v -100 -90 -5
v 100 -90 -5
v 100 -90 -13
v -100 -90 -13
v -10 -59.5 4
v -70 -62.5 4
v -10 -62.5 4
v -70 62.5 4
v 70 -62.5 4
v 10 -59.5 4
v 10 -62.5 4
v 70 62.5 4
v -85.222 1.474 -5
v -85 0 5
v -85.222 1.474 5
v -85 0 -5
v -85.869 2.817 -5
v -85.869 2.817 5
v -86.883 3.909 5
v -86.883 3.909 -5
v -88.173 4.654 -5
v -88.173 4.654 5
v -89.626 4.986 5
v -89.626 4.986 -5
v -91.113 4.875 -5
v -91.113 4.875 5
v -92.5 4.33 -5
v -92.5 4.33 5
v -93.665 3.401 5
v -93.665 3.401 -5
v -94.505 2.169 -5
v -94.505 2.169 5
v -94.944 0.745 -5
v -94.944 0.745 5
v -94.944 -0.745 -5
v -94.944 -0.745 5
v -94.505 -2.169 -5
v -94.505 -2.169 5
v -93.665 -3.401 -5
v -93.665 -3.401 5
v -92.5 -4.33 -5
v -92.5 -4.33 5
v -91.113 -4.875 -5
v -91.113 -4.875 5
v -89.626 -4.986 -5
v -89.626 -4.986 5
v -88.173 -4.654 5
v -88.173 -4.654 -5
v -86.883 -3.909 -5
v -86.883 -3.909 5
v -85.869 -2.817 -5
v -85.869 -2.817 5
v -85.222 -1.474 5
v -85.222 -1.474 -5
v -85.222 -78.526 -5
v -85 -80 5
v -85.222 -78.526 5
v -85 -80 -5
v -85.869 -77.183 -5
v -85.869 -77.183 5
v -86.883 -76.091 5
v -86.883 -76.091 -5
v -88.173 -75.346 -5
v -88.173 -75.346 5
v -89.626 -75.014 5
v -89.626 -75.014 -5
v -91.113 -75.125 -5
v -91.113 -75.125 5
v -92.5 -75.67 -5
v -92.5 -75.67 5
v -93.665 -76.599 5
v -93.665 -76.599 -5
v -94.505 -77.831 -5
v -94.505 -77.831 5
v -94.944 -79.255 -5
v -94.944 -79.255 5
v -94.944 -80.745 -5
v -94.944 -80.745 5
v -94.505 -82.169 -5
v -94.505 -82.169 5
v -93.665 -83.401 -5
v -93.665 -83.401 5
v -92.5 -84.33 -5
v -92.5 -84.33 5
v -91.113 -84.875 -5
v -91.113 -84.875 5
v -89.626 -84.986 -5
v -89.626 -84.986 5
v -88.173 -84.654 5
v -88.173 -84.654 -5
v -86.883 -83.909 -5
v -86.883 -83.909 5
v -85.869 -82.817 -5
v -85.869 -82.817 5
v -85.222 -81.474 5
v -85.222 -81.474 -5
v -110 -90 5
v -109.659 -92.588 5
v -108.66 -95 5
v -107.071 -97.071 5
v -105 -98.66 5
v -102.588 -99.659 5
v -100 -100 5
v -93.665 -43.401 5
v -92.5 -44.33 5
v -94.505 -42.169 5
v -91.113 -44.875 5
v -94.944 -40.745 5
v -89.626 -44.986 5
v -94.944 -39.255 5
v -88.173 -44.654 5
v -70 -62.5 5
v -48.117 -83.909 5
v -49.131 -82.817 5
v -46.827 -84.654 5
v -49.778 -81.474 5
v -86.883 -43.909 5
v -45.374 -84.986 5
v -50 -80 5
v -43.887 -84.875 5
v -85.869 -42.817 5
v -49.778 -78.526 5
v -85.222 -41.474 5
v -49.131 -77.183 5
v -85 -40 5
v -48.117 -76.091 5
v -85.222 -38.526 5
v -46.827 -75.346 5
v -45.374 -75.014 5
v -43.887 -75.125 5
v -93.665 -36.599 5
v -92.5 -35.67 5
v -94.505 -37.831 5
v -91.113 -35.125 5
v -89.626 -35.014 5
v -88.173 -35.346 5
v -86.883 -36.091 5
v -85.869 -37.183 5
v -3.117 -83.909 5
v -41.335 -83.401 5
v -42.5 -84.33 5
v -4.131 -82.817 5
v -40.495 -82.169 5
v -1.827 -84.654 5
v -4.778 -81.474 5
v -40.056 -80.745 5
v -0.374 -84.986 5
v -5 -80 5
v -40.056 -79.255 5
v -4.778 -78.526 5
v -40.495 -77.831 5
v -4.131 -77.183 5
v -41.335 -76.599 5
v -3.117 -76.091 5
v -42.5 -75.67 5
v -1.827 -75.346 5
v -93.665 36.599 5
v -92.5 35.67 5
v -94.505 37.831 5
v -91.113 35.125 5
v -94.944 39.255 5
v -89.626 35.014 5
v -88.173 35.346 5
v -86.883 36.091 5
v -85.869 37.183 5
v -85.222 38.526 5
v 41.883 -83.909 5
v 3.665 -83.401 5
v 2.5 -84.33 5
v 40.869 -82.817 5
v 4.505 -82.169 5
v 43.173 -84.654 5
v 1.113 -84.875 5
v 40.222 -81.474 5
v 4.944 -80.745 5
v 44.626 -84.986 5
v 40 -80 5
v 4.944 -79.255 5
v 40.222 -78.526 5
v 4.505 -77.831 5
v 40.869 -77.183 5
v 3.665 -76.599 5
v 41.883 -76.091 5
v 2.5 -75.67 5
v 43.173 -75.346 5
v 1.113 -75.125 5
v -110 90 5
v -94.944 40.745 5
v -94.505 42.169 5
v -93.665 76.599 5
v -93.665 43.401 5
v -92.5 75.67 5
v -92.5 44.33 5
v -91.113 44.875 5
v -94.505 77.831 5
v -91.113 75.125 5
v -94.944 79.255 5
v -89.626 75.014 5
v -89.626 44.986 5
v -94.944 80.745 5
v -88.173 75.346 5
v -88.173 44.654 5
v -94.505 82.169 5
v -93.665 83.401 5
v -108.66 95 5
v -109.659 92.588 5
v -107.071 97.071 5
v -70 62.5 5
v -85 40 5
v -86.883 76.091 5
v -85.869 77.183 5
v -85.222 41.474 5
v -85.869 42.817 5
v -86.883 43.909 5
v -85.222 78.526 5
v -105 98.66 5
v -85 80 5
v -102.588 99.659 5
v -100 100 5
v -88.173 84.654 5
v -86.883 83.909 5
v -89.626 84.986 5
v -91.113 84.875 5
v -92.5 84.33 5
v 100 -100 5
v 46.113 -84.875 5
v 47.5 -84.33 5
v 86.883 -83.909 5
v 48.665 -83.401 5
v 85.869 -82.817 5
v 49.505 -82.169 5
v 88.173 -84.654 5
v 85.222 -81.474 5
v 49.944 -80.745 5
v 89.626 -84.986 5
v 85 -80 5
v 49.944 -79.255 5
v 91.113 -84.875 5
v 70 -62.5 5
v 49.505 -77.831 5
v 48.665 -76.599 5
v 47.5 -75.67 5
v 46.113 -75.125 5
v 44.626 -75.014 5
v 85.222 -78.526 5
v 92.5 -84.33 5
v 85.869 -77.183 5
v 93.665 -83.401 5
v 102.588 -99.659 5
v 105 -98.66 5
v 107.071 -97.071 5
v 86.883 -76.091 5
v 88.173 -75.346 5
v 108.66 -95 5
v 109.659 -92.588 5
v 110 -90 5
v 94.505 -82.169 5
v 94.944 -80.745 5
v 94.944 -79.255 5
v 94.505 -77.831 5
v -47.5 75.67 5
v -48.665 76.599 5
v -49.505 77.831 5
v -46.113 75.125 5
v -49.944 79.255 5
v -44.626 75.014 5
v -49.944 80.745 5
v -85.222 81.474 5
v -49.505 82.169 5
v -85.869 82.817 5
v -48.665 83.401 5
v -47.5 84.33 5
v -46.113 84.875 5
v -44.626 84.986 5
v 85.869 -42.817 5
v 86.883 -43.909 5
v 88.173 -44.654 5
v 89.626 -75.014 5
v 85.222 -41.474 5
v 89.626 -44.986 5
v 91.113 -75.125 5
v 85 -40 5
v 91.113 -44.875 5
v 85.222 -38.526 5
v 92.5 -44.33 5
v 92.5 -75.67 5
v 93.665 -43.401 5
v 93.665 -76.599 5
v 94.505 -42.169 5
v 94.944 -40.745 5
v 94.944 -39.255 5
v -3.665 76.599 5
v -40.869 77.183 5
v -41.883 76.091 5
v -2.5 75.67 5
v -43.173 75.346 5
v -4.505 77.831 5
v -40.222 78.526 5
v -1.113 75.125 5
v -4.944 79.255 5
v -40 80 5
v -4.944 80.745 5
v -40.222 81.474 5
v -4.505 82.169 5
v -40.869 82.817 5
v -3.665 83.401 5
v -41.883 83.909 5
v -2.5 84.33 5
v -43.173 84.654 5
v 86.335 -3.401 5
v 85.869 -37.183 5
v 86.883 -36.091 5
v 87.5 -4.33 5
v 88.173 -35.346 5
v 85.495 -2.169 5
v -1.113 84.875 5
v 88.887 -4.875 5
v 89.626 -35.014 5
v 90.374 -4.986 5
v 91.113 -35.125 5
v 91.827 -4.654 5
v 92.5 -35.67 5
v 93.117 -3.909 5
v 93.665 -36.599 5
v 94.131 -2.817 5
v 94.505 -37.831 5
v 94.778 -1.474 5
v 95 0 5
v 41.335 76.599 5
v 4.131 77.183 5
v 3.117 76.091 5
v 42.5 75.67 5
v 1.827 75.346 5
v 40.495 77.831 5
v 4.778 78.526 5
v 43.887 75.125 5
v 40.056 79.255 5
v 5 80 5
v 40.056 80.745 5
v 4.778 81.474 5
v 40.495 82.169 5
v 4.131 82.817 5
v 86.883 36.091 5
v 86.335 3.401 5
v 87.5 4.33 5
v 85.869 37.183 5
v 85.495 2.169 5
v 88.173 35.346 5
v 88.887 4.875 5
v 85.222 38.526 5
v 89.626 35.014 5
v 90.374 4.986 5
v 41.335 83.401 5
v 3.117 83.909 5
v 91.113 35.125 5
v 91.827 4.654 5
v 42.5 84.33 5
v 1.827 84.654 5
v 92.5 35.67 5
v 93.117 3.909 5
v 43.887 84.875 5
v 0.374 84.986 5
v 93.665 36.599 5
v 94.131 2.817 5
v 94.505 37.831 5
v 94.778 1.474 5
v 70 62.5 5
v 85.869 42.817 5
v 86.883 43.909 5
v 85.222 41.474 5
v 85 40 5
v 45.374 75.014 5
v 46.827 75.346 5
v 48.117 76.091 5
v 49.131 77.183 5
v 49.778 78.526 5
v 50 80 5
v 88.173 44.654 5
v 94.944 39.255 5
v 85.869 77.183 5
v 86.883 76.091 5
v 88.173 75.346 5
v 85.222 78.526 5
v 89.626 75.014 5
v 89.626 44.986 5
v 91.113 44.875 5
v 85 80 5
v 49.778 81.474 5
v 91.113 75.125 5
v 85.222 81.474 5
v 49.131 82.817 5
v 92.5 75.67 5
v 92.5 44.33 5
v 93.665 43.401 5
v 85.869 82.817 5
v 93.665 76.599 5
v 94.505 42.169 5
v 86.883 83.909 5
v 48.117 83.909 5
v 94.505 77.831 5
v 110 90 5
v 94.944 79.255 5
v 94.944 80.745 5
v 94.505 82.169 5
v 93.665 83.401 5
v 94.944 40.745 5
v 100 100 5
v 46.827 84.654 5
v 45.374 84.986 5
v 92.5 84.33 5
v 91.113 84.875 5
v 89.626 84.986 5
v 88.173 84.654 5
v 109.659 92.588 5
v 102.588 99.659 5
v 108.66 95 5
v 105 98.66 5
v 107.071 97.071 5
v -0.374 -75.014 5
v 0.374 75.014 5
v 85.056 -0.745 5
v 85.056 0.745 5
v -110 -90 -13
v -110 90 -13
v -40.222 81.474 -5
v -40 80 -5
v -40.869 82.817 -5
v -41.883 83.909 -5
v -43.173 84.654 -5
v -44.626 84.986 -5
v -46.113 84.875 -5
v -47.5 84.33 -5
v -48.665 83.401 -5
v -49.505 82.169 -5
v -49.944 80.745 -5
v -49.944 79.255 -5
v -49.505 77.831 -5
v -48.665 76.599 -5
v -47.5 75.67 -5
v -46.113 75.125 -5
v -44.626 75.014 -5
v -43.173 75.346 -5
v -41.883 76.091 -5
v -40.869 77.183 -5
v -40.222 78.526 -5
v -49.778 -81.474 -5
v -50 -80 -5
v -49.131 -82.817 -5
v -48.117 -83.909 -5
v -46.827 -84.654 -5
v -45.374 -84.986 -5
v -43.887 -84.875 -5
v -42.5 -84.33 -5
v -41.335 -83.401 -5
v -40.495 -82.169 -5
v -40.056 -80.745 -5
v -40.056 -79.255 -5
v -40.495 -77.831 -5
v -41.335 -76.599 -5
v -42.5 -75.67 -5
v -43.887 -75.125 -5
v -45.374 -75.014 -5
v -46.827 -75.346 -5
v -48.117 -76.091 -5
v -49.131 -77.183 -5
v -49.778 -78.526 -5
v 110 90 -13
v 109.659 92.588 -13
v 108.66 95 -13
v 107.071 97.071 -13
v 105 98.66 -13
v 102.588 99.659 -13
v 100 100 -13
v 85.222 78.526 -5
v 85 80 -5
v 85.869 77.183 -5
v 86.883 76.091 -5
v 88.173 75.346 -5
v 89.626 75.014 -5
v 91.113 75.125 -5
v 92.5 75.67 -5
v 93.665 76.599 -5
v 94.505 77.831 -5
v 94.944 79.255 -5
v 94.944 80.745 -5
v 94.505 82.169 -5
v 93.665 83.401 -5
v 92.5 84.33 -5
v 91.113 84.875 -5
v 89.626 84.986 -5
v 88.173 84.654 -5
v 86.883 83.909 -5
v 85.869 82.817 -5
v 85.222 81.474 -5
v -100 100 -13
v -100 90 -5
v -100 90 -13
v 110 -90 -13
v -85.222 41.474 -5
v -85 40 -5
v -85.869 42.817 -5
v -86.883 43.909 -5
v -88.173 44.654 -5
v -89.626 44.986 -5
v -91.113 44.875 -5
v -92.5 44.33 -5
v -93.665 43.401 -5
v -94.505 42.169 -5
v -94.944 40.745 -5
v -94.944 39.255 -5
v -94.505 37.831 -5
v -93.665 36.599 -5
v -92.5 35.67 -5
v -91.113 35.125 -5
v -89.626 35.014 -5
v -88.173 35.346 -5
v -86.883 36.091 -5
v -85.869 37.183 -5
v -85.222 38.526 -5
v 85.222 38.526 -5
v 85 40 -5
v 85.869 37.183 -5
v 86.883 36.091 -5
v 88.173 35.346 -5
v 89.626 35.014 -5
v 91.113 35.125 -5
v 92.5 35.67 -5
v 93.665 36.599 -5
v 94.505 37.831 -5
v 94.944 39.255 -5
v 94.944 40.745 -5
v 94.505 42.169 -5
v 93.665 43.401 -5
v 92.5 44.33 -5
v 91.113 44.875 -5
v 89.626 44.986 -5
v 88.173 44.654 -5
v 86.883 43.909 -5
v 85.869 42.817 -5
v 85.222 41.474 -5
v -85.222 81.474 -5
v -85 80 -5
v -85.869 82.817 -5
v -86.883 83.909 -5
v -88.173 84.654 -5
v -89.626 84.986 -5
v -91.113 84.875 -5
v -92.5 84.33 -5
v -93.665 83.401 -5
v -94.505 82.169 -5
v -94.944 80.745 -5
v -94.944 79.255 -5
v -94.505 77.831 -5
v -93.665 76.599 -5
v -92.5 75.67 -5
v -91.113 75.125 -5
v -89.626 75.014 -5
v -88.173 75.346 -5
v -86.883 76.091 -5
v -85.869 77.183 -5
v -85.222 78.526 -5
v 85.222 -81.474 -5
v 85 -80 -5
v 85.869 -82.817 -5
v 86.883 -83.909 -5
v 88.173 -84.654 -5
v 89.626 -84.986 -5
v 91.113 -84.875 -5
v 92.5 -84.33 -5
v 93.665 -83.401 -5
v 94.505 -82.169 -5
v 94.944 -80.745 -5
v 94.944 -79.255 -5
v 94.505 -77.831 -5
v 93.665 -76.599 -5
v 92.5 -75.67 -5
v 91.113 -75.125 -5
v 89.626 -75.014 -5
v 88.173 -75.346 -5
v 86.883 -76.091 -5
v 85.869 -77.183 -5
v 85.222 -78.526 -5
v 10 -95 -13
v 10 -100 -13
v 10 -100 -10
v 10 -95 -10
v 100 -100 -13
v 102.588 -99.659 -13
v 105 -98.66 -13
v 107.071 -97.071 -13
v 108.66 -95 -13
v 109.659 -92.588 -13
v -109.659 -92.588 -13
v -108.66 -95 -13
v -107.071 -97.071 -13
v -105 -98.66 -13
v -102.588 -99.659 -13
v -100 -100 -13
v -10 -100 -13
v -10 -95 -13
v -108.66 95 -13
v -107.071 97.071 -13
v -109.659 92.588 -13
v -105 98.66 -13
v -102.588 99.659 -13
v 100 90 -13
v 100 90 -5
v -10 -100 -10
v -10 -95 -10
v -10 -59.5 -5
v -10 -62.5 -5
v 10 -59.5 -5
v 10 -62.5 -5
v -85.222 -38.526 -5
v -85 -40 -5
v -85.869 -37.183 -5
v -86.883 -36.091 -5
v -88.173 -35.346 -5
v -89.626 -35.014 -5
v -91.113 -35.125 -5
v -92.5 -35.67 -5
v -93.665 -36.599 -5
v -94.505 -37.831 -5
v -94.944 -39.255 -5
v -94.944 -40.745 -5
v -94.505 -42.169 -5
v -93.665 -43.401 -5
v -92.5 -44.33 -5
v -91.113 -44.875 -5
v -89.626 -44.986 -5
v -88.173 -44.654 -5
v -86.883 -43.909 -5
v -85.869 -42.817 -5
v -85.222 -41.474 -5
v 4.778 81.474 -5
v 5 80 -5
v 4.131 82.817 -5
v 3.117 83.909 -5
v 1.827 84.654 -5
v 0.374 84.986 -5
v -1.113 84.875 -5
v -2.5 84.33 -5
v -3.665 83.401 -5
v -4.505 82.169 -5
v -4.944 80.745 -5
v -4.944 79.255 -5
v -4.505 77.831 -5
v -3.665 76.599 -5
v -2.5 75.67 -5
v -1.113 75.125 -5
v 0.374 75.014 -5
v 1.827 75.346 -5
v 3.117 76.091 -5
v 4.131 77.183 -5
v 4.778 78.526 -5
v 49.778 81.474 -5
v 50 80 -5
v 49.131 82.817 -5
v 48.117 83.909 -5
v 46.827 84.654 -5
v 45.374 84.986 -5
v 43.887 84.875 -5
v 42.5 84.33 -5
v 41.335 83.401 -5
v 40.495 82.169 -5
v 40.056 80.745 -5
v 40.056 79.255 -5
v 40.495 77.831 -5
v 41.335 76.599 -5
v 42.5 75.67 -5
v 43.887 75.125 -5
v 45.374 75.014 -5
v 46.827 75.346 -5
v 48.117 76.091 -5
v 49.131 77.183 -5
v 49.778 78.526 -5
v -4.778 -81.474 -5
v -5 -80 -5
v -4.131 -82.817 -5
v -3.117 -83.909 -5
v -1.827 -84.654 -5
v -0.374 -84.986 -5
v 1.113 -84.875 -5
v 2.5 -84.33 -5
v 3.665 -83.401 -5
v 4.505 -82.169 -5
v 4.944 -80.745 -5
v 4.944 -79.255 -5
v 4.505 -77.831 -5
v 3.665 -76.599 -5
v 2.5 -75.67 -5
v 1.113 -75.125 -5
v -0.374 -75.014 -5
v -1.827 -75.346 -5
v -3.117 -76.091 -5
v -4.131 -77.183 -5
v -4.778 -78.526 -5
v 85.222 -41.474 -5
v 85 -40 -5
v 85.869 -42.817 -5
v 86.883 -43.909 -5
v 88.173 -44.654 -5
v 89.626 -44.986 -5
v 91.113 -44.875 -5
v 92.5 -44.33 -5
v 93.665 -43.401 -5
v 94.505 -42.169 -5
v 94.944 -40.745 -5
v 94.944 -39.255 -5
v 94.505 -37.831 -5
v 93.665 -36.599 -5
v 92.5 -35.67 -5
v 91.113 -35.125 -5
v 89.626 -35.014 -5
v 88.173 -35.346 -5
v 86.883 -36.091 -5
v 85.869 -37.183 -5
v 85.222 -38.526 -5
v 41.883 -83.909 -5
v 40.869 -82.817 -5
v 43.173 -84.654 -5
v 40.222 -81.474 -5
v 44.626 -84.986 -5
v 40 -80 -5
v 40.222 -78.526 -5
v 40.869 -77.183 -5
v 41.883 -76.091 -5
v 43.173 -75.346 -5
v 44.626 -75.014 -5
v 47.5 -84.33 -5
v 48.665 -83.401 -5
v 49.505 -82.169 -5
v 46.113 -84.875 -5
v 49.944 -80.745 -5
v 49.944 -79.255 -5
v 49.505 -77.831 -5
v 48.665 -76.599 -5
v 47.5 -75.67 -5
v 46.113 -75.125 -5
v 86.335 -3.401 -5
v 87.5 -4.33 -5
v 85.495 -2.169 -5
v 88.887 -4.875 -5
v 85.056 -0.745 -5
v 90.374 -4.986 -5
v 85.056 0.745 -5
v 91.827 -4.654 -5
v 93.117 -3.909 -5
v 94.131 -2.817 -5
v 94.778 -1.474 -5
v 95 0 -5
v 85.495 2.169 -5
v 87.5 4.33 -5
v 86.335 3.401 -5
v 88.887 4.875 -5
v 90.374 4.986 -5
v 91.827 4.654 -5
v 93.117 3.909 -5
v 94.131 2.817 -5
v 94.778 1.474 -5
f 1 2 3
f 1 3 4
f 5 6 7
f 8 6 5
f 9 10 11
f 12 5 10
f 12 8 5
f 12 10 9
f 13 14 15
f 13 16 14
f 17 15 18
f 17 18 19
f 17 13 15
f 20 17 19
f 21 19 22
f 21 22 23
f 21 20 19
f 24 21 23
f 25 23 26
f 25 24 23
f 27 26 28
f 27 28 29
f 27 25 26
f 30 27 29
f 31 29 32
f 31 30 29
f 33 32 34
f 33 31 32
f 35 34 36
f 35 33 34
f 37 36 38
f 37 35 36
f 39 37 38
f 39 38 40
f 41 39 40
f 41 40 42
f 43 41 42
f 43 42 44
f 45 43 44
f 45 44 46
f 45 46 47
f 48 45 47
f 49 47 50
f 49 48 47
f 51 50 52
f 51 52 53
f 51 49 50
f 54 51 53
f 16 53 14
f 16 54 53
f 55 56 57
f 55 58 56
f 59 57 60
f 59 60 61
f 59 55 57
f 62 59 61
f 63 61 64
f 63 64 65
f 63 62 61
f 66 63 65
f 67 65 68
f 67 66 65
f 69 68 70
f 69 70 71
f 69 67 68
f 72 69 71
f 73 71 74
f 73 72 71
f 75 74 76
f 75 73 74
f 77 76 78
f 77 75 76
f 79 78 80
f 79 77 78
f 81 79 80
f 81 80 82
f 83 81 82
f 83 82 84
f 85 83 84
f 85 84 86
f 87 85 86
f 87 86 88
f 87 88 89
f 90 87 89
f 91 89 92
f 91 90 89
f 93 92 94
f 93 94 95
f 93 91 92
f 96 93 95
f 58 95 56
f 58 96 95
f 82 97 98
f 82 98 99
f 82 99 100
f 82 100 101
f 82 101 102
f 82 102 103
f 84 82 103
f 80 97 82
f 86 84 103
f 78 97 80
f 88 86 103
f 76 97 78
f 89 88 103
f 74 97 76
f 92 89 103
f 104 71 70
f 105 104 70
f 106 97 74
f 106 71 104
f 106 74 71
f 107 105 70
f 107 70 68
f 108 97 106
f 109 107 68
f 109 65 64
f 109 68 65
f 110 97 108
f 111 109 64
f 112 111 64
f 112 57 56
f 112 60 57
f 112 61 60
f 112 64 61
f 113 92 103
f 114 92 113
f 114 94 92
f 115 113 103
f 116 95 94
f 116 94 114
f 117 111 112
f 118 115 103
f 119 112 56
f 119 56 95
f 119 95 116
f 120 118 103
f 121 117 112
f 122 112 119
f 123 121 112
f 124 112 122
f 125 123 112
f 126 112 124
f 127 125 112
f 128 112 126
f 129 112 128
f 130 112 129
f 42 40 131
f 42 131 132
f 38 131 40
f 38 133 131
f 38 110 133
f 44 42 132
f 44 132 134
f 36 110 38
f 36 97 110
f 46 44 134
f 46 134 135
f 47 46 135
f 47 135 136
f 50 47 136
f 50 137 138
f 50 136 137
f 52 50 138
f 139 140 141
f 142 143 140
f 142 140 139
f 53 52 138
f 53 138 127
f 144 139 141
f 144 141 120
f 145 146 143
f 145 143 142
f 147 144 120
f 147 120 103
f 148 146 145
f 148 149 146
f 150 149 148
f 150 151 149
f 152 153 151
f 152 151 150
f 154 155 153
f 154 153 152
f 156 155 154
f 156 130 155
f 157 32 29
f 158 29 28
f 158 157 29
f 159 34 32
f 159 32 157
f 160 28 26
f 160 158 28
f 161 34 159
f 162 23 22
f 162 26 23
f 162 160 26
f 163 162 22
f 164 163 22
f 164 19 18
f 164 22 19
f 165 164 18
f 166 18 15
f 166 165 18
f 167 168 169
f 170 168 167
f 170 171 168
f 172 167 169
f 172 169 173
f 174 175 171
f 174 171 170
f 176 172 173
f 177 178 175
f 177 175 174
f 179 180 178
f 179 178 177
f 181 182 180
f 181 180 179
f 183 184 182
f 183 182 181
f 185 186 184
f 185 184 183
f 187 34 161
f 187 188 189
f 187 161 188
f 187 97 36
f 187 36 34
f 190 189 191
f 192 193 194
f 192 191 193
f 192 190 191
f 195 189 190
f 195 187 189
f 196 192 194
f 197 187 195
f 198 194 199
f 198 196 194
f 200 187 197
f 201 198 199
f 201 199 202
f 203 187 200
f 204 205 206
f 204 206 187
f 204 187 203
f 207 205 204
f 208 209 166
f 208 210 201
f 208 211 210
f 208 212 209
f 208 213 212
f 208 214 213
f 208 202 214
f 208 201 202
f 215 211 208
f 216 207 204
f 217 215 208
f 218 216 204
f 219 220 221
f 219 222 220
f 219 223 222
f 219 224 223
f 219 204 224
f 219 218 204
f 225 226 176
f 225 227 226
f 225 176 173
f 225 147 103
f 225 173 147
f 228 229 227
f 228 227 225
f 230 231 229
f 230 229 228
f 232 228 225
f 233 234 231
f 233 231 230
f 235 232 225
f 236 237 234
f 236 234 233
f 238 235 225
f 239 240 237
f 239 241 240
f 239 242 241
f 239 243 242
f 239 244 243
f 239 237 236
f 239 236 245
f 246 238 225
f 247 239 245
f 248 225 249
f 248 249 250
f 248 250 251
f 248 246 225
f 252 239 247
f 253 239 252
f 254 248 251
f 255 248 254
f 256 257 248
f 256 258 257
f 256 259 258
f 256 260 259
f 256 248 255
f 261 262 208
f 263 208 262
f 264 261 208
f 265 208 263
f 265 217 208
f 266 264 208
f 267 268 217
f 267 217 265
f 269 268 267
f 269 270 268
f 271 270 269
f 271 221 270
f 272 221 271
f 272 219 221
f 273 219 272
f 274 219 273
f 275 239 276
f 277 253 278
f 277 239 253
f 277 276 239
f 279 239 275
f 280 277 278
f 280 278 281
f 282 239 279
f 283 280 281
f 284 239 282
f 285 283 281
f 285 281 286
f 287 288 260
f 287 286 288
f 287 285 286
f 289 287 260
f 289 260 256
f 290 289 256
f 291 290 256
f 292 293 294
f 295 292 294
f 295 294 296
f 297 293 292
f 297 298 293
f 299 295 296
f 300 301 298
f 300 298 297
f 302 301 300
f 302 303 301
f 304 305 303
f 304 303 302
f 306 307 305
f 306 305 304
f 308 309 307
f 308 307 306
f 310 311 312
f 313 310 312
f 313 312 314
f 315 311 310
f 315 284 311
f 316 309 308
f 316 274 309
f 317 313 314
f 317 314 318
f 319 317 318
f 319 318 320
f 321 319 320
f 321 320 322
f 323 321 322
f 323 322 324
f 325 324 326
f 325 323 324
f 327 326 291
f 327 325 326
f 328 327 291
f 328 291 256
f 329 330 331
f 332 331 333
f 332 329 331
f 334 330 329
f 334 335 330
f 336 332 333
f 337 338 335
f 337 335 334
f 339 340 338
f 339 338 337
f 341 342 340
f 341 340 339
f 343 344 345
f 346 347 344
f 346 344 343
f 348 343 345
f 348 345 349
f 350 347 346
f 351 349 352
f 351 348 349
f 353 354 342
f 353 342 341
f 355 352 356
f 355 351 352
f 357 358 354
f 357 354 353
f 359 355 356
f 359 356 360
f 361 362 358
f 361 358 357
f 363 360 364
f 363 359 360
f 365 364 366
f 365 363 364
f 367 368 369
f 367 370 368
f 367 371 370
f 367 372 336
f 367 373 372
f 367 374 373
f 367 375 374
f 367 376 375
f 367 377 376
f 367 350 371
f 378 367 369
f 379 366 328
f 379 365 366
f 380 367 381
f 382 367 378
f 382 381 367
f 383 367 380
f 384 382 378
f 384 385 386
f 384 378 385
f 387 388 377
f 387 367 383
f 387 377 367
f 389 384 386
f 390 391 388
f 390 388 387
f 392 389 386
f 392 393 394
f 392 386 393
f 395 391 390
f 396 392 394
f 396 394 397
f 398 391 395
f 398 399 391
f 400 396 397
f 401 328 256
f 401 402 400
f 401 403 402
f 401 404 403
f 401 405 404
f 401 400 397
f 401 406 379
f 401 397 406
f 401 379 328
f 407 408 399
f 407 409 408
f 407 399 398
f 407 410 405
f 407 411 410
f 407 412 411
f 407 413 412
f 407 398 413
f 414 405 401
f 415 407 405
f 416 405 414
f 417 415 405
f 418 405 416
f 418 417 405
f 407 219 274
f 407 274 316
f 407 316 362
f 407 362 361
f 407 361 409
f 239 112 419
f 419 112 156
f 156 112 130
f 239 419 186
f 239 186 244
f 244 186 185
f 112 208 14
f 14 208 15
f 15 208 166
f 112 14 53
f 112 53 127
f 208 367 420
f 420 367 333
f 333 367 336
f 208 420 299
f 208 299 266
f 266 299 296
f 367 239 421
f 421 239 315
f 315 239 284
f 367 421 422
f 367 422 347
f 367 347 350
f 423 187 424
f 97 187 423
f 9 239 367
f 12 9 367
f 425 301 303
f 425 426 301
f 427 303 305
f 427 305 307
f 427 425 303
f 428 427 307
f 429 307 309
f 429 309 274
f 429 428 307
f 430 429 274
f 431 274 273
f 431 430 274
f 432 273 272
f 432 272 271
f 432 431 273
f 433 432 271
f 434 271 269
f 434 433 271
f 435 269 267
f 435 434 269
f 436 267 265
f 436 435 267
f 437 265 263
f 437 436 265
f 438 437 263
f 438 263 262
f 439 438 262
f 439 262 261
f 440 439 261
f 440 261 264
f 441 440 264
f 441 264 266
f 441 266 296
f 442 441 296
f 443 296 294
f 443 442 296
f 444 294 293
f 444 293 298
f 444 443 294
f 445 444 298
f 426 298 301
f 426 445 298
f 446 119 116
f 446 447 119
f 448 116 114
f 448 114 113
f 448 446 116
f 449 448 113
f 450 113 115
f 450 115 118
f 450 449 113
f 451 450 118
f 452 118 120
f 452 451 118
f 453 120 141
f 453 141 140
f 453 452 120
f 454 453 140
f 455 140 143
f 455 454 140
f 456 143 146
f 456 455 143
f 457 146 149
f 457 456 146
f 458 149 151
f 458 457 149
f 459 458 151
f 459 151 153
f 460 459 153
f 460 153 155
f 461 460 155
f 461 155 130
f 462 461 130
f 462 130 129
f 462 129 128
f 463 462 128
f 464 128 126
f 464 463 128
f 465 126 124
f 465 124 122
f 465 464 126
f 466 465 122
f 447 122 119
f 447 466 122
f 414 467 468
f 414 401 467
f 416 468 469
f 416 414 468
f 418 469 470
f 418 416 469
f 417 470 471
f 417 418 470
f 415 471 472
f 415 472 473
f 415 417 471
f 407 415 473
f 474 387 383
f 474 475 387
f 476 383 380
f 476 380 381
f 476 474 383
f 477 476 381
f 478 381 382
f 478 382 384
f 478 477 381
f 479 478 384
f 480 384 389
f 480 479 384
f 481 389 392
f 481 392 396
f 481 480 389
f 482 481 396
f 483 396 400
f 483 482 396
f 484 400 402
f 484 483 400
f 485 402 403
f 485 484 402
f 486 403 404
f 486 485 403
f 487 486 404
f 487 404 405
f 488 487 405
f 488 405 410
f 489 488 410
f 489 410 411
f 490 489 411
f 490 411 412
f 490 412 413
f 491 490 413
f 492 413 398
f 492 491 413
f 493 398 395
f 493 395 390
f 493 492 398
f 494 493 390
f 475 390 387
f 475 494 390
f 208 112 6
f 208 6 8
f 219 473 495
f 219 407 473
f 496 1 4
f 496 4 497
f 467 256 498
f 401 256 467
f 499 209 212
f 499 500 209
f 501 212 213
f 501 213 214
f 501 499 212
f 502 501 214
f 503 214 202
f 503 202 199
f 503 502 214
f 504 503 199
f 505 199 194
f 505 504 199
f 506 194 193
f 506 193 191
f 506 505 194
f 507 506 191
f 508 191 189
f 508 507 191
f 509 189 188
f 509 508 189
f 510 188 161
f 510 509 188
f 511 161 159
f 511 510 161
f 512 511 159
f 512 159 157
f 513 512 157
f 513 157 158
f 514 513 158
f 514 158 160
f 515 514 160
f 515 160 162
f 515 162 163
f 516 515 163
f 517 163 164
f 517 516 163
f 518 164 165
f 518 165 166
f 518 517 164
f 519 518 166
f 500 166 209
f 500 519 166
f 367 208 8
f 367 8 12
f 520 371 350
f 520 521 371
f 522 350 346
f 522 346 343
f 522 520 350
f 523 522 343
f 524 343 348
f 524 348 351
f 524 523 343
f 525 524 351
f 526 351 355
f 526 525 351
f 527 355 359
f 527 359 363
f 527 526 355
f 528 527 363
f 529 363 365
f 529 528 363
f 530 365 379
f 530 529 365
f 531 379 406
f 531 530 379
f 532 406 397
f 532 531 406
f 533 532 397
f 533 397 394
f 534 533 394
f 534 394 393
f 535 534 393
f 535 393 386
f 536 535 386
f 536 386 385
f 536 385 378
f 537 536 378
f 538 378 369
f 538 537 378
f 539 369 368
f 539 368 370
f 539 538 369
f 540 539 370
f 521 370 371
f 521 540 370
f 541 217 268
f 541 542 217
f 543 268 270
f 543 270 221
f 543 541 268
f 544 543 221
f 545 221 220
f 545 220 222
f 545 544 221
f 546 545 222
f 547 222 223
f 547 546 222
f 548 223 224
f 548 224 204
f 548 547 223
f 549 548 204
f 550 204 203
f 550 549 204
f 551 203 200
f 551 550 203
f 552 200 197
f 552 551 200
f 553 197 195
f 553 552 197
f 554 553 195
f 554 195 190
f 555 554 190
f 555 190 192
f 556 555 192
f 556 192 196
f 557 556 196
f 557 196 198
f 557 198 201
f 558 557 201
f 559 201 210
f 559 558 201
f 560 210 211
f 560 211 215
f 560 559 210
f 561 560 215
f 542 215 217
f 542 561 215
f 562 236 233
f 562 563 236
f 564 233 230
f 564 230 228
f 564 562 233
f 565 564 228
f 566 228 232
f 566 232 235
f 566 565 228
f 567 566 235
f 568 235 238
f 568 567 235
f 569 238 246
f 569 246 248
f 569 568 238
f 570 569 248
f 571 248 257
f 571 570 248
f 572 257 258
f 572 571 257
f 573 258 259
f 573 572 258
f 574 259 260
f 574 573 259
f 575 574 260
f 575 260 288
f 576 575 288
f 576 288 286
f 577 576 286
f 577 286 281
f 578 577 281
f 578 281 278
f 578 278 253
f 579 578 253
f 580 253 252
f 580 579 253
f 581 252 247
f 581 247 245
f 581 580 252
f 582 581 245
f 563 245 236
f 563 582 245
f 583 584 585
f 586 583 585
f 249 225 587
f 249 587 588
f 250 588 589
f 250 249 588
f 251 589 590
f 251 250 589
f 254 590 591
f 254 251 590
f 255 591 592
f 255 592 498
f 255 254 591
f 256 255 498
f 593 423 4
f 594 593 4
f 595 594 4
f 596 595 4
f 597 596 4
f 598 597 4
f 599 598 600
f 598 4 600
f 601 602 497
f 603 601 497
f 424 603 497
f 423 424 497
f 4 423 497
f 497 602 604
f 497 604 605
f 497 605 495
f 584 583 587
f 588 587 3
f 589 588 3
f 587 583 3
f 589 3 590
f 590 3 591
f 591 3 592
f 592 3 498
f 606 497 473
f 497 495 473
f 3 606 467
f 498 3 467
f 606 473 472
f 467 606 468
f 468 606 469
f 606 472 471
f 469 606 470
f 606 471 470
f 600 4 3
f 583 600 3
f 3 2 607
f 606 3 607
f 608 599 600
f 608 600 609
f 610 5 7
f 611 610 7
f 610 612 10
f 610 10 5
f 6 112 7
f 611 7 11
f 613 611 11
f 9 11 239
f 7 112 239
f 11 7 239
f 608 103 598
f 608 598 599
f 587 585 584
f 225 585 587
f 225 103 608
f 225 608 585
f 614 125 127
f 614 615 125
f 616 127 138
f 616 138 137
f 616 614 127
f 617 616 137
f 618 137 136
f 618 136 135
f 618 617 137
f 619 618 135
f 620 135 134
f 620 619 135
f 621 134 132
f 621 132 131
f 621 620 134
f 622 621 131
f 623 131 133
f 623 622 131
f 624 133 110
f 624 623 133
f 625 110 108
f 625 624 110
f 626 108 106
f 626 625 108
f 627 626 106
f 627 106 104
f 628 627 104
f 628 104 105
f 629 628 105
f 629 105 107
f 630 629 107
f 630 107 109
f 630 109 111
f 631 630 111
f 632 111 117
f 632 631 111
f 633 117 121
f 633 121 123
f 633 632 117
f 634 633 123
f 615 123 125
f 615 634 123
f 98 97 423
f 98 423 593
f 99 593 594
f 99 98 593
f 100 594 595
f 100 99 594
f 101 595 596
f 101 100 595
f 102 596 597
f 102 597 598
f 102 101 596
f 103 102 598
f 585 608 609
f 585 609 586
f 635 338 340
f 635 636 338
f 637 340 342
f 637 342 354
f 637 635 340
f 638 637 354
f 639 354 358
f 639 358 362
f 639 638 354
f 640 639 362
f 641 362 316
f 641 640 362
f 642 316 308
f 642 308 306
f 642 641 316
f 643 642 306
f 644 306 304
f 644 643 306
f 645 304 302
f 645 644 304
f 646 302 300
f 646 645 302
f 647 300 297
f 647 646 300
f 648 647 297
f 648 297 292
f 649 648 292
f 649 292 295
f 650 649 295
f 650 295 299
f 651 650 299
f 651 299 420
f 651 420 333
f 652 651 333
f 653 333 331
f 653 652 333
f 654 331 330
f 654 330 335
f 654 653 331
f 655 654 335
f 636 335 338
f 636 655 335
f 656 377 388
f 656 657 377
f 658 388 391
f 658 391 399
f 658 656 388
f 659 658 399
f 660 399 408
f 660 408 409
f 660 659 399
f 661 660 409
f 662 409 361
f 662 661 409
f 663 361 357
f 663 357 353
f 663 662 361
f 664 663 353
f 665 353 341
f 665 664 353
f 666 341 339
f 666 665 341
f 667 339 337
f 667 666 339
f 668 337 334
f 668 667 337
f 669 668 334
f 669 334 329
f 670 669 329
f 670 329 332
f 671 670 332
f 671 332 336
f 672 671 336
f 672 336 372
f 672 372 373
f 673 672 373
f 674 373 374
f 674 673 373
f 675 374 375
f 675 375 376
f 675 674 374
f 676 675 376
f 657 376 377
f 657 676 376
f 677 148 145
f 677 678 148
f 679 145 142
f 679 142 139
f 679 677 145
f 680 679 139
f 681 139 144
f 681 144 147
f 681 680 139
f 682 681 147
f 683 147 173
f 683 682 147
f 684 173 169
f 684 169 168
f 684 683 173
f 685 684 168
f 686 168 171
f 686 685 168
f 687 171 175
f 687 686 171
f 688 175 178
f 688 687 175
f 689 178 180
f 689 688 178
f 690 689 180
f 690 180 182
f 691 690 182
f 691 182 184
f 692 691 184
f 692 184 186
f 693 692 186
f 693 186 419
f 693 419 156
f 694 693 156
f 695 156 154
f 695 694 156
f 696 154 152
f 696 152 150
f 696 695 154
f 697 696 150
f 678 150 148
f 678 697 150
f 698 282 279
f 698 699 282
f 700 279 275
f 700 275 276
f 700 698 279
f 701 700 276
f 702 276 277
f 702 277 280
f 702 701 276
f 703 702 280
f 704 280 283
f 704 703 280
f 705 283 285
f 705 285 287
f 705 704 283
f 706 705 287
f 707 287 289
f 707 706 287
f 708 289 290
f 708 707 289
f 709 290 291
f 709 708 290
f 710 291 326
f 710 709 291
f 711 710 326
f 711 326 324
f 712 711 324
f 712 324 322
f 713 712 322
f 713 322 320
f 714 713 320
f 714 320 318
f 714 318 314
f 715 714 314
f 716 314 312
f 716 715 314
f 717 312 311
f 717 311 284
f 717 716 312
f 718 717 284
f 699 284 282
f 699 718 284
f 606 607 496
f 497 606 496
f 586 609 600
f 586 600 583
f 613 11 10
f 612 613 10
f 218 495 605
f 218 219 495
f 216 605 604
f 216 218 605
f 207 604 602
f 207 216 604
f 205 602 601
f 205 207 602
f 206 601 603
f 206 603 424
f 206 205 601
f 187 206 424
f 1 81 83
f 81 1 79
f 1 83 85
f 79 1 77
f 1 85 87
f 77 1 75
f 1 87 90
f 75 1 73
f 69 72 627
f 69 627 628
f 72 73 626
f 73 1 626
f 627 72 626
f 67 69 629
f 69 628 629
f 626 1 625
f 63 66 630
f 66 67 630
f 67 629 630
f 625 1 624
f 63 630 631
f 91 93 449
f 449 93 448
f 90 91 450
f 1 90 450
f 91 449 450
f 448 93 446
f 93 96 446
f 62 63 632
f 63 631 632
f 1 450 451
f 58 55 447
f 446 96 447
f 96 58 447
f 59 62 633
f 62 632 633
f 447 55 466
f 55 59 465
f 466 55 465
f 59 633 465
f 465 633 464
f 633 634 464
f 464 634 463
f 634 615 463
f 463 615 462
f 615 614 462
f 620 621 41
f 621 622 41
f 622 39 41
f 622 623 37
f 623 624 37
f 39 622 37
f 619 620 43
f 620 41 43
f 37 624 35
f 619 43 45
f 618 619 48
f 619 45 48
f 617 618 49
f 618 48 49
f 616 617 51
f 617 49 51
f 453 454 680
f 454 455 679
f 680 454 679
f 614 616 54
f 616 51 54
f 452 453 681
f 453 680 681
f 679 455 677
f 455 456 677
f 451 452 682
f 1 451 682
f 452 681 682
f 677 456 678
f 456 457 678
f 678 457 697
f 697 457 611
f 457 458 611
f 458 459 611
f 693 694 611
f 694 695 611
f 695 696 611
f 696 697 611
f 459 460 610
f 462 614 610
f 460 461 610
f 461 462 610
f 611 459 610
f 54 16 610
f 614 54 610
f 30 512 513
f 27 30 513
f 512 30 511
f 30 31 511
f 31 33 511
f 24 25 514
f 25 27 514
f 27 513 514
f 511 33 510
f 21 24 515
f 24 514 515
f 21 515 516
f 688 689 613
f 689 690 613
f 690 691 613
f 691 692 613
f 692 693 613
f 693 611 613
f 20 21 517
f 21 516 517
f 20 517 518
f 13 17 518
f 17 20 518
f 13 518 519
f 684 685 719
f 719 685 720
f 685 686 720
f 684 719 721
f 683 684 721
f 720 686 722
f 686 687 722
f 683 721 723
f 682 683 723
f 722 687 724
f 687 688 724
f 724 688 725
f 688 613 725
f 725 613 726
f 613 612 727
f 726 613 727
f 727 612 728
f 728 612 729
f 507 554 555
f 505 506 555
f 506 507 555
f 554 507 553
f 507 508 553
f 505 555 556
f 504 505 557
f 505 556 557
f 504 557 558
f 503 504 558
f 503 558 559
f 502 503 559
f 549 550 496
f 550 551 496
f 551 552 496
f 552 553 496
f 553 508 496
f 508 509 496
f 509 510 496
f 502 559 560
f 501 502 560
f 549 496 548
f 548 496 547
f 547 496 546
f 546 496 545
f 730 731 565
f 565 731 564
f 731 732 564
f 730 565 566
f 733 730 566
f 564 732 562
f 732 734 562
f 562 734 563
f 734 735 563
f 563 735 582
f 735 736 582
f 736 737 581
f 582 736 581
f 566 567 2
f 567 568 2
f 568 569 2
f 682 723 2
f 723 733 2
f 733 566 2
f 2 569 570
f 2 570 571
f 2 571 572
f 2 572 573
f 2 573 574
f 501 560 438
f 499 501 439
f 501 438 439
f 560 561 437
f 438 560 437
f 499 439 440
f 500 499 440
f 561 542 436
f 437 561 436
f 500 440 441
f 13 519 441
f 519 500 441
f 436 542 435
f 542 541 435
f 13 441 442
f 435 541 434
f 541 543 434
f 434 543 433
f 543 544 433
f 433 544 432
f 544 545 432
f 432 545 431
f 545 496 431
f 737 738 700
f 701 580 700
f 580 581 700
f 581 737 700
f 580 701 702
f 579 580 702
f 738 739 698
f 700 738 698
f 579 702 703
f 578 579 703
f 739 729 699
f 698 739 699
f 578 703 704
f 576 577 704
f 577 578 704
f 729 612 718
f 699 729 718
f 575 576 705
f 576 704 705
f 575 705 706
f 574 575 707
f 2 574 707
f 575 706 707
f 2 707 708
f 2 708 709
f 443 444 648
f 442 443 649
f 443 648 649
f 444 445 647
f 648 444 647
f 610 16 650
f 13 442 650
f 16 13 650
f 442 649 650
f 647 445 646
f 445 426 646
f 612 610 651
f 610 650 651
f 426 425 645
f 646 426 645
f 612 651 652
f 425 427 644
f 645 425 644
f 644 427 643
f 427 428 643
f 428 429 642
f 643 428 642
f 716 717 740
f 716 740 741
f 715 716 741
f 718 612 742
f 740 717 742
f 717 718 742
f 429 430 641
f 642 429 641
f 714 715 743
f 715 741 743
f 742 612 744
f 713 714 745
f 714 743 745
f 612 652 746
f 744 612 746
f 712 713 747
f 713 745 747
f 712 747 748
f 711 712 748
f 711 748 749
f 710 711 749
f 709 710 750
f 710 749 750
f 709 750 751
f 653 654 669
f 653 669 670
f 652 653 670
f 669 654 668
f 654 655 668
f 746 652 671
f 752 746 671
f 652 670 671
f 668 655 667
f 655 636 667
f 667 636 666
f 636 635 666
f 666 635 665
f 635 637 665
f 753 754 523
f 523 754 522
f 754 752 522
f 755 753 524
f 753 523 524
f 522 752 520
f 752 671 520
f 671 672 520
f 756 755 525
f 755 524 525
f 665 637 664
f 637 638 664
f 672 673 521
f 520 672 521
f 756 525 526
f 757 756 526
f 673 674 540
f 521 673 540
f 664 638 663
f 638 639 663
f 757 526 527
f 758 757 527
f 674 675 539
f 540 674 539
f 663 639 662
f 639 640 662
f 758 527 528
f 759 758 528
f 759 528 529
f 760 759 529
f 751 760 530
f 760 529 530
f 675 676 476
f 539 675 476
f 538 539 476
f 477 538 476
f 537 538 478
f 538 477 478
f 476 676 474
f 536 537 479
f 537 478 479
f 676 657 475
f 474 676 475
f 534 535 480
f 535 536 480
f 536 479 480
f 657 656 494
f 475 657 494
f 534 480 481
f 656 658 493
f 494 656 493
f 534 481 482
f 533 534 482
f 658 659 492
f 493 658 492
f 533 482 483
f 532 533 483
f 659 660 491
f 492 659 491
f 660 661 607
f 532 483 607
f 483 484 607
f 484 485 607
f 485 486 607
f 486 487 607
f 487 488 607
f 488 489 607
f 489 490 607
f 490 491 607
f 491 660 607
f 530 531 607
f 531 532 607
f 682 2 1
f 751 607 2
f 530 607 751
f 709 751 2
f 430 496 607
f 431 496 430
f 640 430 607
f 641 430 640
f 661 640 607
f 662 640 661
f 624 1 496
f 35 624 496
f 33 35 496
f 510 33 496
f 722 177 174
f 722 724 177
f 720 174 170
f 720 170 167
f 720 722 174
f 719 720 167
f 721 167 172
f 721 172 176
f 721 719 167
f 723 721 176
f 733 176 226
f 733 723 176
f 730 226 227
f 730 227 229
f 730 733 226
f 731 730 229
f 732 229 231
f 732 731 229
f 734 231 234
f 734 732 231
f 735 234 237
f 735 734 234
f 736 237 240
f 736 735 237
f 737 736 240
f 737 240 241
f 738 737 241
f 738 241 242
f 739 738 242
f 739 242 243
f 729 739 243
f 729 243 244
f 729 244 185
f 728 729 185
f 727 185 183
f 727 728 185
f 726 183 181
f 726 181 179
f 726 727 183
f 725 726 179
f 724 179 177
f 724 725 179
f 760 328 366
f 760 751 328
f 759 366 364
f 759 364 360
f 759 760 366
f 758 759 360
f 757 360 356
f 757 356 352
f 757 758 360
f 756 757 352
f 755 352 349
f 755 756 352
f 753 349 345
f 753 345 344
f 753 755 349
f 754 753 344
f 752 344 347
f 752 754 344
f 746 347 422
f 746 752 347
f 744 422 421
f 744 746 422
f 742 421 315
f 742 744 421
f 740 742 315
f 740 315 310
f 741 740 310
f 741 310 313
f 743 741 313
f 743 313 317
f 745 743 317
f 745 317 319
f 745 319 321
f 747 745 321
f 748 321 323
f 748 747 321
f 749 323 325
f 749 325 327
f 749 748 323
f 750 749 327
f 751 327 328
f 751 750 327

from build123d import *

# Parameters (mm, degrees)
SKETCH_1_R               = 5
EXTRUDE_1_DEPTH          = 5
SKETCH_3_W               = 200
SKETCH_3_H               = 180
EXTRUDE_2_DEPTH          = 8
SKETCH_4_W               = 140
SKETCH_4_H               = 125
CUT_EXTRUDE_1_DEPTH      = 1
CUT_EXTRUDE_2_DEPTH      = 150.629542538
CUT_EXTRUDE_2_DEPTH_BACK = 150.629542538
SKETCH_6_W               = 20
SKETCH_6_H               = 3
CUT_EXTRUDE_3_DEPTH      = 5


with BuildPart() as part:
    # 草图1 → 凸台-拉伸1 (new, symmetric)
    with BuildSketch(Plane.XY):
        with BuildLine():
            Line((-100, -100), (100, -100))
            ThreePointArc((100, -100), (107.071067812, -97.071067812), (110, -90))
            Line((110, -90), (110, 90))
            ThreePointArc((110, 90), (107.071067812, 97.071067812), (100, 100))
            Line((100, 100), (-100, 100))
            ThreePointArc((-100, 100), (-107.071067812, 97.071067812), (-110, 90))
            Line((-110, 90), (-110, -90))
            ThreePointArc((-110, -90), (-107.071067812, -97.071067812), (-100, -100))
        make_face()
        with Locations((-90, 0)):
            Circle(SKETCH_1_R, mode=Mode.SUBTRACT)
        with Locations((90, 0)):
            Circle(SKETCH_1_R, mode=Mode.SUBTRACT)
        with Locations((-90, 40)):
            Circle(SKETCH_1_R, mode=Mode.SUBTRACT)
        with Locations((-90, -40)):
            Circle(SKETCH_1_R, mode=Mode.SUBTRACT)
        with Locations(Location((90, -40, 0), (0, 0, 180))):
            Circle(SKETCH_1_R, mode=Mode.SUBTRACT)
        with Locations(Location((90, 40, 0), (0, 0, 180))):
            Circle(SKETCH_1_R, mode=Mode.SUBTRACT)
        with Locations((-90, -80)):
            Circle(SKETCH_1_R, mode=Mode.SUBTRACT)
        with Locations((-90, 80)):
            Circle(SKETCH_1_R, mode=Mode.SUBTRACT)
        with Locations(Location((90, -80, 0), (0, 0, 180))):
            Circle(SKETCH_1_R, mode=Mode.SUBTRACT)
        with Locations(Location((90, 80, 0), (0, 0, 180))):
            Circle(SKETCH_1_R, mode=Mode.SUBTRACT)
        with Locations((0, 80)):
            Circle(SKETCH_1_R, mode=Mode.SUBTRACT)
        with Locations((-45, 80)):
            Circle(SKETCH_1_R, mode=Mode.SUBTRACT)
        with Locations((45, 80)):
            Circle(SKETCH_1_R, mode=Mode.SUBTRACT)
        with Locations(Location((45, -80, 0), (0, 0, 180))):
            Circle(SKETCH_1_R, mode=Mode.SUBTRACT)
        with Locations(Location((0, -80, 0), (0, 0, 180))):
            Circle(SKETCH_1_R, mode=Mode.SUBTRACT)
        with Locations(Location((-45, -80, 0), (0, 0, 180))):
            Circle(SKETCH_1_R, mode=Mode.SUBTRACT)
    extrude(amount=EXTRUDE_1_DEPTH, both=True)

    # 草图3 → 凸台-拉伸2 (add)
    with BuildSketch(Plane(origin=(0, 0, -5), x_dir=(-1, 0, 0), z_dir=(0, 0, -1))):
        with BuildLine():
            Line((110, 90), (110, -90))
            ThreePointArc((110, -90), (107.071067812, -97.071067812), (100, -100))
            Line((100, -100), (-100, -100))
            ThreePointArc((-100, -100), (-107.071067812, -97.071067812), (-110, -90))
            Line((-110, -90), (-110, 90))
            ThreePointArc((-110, 90), (-107.071067812, 97.071067812), (-100, 100))
            Line((-100, 100), (100, 100))
            ThreePointArc((100, 100), (107.071067812, 97.071067812), (110, 90))
        make_face()
        Rectangle(SKETCH_3_W, SKETCH_3_H, mode=Mode.SUBTRACT)
    extrude(amount=EXTRUDE_2_DEPTH)

    # 草图4 → 切除-拉伸1 (cut)
    with BuildSketch(Plane.XY.offset(5)):
        Rectangle(SKETCH_4_W, SKETCH_4_H)
    extrude(amount=-CUT_EXTRUDE_1_DEPTH, mode=Mode.SUBTRACT)

    # 草图5 → 切除-拉伸2 (cut, two sides: drawn at the far end of the back side and taken through both)
    with BuildSketch(Plane.XY.offset(4).offset(-CUT_EXTRUDE_2_DEPTH_BACK)):
        Polygon((0, -62.5), (10, -62.5), (10, -59.5), (-10, -59.5), (-10, -62.5), align=None)
    extrude(amount=CUT_EXTRUDE_2_DEPTH + CUT_EXTRUDE_2_DEPTH_BACK, mode=Mode.SUBTRACT)

    # 草图6 → 切除-拉伸3 (cut)
    with BuildSketch(Plane.XZ.offset(100)):
        with Locations((0, -11.5)):
            Rectangle(SKETCH_6_W, SKETCH_6_H)
    extrude(amount=-CUT_EXTRUDE_3_DEPTH, mode=Mode.SUBTRACT)


solid = part.part
